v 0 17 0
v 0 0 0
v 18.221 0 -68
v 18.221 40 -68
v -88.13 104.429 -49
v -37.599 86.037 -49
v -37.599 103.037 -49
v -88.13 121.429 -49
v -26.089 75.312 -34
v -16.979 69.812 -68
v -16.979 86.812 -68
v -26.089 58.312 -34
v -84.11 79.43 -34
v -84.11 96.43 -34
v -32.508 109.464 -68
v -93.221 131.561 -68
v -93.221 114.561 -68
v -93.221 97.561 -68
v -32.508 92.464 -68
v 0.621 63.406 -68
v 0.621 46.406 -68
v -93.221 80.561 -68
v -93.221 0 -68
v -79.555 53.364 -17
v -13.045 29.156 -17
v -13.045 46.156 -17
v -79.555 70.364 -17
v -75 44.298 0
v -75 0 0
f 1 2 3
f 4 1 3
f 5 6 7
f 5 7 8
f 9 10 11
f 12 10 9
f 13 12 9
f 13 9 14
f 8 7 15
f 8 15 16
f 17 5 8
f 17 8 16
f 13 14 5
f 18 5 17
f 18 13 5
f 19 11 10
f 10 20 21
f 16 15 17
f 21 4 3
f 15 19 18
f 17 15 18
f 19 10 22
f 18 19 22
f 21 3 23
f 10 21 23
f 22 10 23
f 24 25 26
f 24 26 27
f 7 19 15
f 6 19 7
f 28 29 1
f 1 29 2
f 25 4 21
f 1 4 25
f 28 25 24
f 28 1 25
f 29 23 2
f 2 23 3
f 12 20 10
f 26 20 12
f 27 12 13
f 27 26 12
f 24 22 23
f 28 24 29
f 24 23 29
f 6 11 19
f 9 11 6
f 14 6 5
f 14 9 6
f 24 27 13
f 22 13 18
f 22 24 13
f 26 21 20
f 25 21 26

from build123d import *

# Parameters (mm, degrees)
EXTRUDE1_DEPTH     = 90
CUT_EXTRUDE1_DEPTH = 69
SKETCH4_W          = 158.762085971
SKETCH4_H          = 101.139551932
CUT_EXTRUDE2_DEPTH = 30
EXTRUDE2_DEPTH     = 100
CUT_EXTRUDE3_DEPTH = 69
SKETCH8_W          = 142.373577685
SKETCH8_H          = 89.670115664
CUT_EXTRUDE4_DEPTH = 20
EXTRUDE3_DEPTH     = 120
CUT_EXTRUDE5_DEPTH = 69
SKETCH12_W         = 148.763155866
SKETCH12_H         = 89.075175212
CUT_EXTRUDE6_DEPTH = 20
EXTRUDE4_DEPTH     = 140
CUT_EXTRUDE7_DEPTH = 69
SKETCH16_W         = 108.093048797
SKETCH16_H         = 52.640689948
CUT_EXTRUDE8_DEPTH = 10


with BuildPart() as part:
    # Sketch1 → Extrude1 (new body)
    with BuildSketch(Plane(origin=(0, 0, 0), x_dir=(1, 0, 0), z_dir=(0, 1, 0))):
        Polygon((0, 0), (18.220545085, 68), (-93.220545085, 68), (-75, 0), align=None)
    extrude(amount=EXTRUDE1_DEPTH)

    # Sketch2 → Cut-Extrude1 (cut, through all)
    with BuildSketch(Plane(origin=(0, 0, -68), x_dir=(-1, 0, 0), z_dir=(0, 0, -1))):
        Polygon((-18.220545085, 40), (93.220545085, 80.561239696), (93.220545085, 90), (-18.220545085, 90), align=None)
    extrude(amount=-CUT_EXTRUDE1_DEPTH, mode=Mode.SUBTRACT)

    # Sketch4 → Cut-Extrude2 (cut)
    with BuildSketch(Plane(origin=(4.679123258, 12.855785494, 5.602047686), x_dir=(-0.948588376, 0.290160149, 0.126440426), z_dir=(0.316512391, 0.869610646, 0.378942252))):
        with Locations((41.583207075, -49.139243179)):
            Rectangle(SKETCH4_W, SKETCH4_H)
    extrude(amount=CUT_EXTRUDE2_DEPTH, mode=Mode.SUBTRACT)

    # Sketch5 → Extrude2 (add)
    with BuildSketch(Plane(origin=(0, 0, 0), x_dir=(1, 0, 0), z_dir=(0, 1, 0))):
        Polygon((0.620850018, 68), (-13.044558796, 17), (-79.555136271, 17), (-93.220545085, 68), align=None)
    extrude(amount=EXTRUDE2_DEPTH)

    # Sketch6 → Cut-Extrude3 (cut, through all)
    with BuildSketch(Plane(origin=(0, 0, -68), x_dir=(-1, 0, 0), z_dir=(0, 0, -1))):
        Polygon((-0.620850018, 63.405765137), (93.220545085, 97.561239696), (93.220545085, 100), (-0.620850018, 100), align=None)
    extrude(amount=-CUT_EXTRUDE3_DEPTH, mode=Mode.SUBTRACT)

    # Sketch8 → Cut-Extrude4 (cut)
    with BuildSketch(Plane(origin=(9.358246516, 25.711570987, 11.204095371), x_dir=(-0.948588376, 0.290160149, 0.126440426), z_dir=(0.316512391, 0.869610646, 0.378942252))):
        with Locations((46.415862332, -66.070937723)):
            Rectangle(SKETCH8_W, SKETCH8_H)
    extrude(amount=CUT_EXTRUDE4_DEPTH, mode=Mode.SUBTRACT)

    # Sketch9 → Extrude3 (add)
    with BuildSketch(Plane(origin=(0, 0, 0), x_dir=(1, 0, 0), z_dir=(0, 1, 0))):
        Polygon((-16.978845049, 68), (-26.089117591, 34), (-84.110272543, 34), (-93.220545085, 68), align=None)
    extrude(amount=EXTRUDE3_DEPTH)

    # Sketch10 → Cut-Extrude5 (cut, through all)
    with BuildSketch(Plane(origin=(0, 0, -68), x_dir=(-1, 0, 0), z_dir=(0, 0, -1))):
        Polygon((16.978845049, 86.811530273), (93.220545085, 114.561239696), (93.220545085, 120), (16.978845049, 120), align=None)
    extrude(amount=-CUT_EXTRUDE5_DEPTH, mode=Mode.SUBTRACT)

    # Sketch12 → Cut-Extrude6 (cut)
    with BuildSketch(Plane(origin=(14.037369773, 38.567356481, 16.806143057), x_dir=(-0.948588376, 0.290160149, 0.126440426), z_dir=(0.316512391, 0.869610646, 0.378942252))):
        with Locations((45.030500849, -66.338275795)):
            Rectangle(SKETCH12_W, SKETCH12_H)
    extrude(amount=CUT_EXTRUDE6_DEPTH, mode=Mode.SUBTRACT)

    # Sketch13 → Extrude4 (add)
    with BuildSketch(Plane(origin=(0, 0, 0), x_dir=(1, 0, 0), z_dir=(0, 1, 0))):
        Polygon((-93.220545085, 68), (-32.507987755, 68), (-37.599022411, 49), (-88.129510429, 49), align=None)
    extrude(amount=EXTRUDE4_DEPTH)

    # Sketch14 → Cut-Extrude7 (cut, through all)
    with BuildSketch(Plane(origin=(0, 0, -68), x_dir=(-1, 0, 0), z_dir=(0, 0, -1))):
        Polygon((32.507987755, 109.463675982), (93.220545085, 131.561239696), (93.220545085, 140), (32.507987755, 140), align=None)
    extrude(amount=-CUT_EXTRUDE7_DEPTH, mode=Mode.SUBTRACT)

    # Sketch16 → Cut-Extrude8 (cut)
    with BuildSketch(Plane(origin=(18.716493031, 51.423141974, 22.408190743), x_dir=(-0.948588376, 0.290160149, 0.126440426), z_dir=(0.316512391, 0.869610646, 0.378942252))):
        with Locations((79.37385231, -93.938274555)):
            Rectangle(SKETCH16_W, SKETCH16_H)
    extrude(amount=CUT_EXTRUDE8_DEPTH, mode=Mode.SUBTRACT)


solid = part.part
